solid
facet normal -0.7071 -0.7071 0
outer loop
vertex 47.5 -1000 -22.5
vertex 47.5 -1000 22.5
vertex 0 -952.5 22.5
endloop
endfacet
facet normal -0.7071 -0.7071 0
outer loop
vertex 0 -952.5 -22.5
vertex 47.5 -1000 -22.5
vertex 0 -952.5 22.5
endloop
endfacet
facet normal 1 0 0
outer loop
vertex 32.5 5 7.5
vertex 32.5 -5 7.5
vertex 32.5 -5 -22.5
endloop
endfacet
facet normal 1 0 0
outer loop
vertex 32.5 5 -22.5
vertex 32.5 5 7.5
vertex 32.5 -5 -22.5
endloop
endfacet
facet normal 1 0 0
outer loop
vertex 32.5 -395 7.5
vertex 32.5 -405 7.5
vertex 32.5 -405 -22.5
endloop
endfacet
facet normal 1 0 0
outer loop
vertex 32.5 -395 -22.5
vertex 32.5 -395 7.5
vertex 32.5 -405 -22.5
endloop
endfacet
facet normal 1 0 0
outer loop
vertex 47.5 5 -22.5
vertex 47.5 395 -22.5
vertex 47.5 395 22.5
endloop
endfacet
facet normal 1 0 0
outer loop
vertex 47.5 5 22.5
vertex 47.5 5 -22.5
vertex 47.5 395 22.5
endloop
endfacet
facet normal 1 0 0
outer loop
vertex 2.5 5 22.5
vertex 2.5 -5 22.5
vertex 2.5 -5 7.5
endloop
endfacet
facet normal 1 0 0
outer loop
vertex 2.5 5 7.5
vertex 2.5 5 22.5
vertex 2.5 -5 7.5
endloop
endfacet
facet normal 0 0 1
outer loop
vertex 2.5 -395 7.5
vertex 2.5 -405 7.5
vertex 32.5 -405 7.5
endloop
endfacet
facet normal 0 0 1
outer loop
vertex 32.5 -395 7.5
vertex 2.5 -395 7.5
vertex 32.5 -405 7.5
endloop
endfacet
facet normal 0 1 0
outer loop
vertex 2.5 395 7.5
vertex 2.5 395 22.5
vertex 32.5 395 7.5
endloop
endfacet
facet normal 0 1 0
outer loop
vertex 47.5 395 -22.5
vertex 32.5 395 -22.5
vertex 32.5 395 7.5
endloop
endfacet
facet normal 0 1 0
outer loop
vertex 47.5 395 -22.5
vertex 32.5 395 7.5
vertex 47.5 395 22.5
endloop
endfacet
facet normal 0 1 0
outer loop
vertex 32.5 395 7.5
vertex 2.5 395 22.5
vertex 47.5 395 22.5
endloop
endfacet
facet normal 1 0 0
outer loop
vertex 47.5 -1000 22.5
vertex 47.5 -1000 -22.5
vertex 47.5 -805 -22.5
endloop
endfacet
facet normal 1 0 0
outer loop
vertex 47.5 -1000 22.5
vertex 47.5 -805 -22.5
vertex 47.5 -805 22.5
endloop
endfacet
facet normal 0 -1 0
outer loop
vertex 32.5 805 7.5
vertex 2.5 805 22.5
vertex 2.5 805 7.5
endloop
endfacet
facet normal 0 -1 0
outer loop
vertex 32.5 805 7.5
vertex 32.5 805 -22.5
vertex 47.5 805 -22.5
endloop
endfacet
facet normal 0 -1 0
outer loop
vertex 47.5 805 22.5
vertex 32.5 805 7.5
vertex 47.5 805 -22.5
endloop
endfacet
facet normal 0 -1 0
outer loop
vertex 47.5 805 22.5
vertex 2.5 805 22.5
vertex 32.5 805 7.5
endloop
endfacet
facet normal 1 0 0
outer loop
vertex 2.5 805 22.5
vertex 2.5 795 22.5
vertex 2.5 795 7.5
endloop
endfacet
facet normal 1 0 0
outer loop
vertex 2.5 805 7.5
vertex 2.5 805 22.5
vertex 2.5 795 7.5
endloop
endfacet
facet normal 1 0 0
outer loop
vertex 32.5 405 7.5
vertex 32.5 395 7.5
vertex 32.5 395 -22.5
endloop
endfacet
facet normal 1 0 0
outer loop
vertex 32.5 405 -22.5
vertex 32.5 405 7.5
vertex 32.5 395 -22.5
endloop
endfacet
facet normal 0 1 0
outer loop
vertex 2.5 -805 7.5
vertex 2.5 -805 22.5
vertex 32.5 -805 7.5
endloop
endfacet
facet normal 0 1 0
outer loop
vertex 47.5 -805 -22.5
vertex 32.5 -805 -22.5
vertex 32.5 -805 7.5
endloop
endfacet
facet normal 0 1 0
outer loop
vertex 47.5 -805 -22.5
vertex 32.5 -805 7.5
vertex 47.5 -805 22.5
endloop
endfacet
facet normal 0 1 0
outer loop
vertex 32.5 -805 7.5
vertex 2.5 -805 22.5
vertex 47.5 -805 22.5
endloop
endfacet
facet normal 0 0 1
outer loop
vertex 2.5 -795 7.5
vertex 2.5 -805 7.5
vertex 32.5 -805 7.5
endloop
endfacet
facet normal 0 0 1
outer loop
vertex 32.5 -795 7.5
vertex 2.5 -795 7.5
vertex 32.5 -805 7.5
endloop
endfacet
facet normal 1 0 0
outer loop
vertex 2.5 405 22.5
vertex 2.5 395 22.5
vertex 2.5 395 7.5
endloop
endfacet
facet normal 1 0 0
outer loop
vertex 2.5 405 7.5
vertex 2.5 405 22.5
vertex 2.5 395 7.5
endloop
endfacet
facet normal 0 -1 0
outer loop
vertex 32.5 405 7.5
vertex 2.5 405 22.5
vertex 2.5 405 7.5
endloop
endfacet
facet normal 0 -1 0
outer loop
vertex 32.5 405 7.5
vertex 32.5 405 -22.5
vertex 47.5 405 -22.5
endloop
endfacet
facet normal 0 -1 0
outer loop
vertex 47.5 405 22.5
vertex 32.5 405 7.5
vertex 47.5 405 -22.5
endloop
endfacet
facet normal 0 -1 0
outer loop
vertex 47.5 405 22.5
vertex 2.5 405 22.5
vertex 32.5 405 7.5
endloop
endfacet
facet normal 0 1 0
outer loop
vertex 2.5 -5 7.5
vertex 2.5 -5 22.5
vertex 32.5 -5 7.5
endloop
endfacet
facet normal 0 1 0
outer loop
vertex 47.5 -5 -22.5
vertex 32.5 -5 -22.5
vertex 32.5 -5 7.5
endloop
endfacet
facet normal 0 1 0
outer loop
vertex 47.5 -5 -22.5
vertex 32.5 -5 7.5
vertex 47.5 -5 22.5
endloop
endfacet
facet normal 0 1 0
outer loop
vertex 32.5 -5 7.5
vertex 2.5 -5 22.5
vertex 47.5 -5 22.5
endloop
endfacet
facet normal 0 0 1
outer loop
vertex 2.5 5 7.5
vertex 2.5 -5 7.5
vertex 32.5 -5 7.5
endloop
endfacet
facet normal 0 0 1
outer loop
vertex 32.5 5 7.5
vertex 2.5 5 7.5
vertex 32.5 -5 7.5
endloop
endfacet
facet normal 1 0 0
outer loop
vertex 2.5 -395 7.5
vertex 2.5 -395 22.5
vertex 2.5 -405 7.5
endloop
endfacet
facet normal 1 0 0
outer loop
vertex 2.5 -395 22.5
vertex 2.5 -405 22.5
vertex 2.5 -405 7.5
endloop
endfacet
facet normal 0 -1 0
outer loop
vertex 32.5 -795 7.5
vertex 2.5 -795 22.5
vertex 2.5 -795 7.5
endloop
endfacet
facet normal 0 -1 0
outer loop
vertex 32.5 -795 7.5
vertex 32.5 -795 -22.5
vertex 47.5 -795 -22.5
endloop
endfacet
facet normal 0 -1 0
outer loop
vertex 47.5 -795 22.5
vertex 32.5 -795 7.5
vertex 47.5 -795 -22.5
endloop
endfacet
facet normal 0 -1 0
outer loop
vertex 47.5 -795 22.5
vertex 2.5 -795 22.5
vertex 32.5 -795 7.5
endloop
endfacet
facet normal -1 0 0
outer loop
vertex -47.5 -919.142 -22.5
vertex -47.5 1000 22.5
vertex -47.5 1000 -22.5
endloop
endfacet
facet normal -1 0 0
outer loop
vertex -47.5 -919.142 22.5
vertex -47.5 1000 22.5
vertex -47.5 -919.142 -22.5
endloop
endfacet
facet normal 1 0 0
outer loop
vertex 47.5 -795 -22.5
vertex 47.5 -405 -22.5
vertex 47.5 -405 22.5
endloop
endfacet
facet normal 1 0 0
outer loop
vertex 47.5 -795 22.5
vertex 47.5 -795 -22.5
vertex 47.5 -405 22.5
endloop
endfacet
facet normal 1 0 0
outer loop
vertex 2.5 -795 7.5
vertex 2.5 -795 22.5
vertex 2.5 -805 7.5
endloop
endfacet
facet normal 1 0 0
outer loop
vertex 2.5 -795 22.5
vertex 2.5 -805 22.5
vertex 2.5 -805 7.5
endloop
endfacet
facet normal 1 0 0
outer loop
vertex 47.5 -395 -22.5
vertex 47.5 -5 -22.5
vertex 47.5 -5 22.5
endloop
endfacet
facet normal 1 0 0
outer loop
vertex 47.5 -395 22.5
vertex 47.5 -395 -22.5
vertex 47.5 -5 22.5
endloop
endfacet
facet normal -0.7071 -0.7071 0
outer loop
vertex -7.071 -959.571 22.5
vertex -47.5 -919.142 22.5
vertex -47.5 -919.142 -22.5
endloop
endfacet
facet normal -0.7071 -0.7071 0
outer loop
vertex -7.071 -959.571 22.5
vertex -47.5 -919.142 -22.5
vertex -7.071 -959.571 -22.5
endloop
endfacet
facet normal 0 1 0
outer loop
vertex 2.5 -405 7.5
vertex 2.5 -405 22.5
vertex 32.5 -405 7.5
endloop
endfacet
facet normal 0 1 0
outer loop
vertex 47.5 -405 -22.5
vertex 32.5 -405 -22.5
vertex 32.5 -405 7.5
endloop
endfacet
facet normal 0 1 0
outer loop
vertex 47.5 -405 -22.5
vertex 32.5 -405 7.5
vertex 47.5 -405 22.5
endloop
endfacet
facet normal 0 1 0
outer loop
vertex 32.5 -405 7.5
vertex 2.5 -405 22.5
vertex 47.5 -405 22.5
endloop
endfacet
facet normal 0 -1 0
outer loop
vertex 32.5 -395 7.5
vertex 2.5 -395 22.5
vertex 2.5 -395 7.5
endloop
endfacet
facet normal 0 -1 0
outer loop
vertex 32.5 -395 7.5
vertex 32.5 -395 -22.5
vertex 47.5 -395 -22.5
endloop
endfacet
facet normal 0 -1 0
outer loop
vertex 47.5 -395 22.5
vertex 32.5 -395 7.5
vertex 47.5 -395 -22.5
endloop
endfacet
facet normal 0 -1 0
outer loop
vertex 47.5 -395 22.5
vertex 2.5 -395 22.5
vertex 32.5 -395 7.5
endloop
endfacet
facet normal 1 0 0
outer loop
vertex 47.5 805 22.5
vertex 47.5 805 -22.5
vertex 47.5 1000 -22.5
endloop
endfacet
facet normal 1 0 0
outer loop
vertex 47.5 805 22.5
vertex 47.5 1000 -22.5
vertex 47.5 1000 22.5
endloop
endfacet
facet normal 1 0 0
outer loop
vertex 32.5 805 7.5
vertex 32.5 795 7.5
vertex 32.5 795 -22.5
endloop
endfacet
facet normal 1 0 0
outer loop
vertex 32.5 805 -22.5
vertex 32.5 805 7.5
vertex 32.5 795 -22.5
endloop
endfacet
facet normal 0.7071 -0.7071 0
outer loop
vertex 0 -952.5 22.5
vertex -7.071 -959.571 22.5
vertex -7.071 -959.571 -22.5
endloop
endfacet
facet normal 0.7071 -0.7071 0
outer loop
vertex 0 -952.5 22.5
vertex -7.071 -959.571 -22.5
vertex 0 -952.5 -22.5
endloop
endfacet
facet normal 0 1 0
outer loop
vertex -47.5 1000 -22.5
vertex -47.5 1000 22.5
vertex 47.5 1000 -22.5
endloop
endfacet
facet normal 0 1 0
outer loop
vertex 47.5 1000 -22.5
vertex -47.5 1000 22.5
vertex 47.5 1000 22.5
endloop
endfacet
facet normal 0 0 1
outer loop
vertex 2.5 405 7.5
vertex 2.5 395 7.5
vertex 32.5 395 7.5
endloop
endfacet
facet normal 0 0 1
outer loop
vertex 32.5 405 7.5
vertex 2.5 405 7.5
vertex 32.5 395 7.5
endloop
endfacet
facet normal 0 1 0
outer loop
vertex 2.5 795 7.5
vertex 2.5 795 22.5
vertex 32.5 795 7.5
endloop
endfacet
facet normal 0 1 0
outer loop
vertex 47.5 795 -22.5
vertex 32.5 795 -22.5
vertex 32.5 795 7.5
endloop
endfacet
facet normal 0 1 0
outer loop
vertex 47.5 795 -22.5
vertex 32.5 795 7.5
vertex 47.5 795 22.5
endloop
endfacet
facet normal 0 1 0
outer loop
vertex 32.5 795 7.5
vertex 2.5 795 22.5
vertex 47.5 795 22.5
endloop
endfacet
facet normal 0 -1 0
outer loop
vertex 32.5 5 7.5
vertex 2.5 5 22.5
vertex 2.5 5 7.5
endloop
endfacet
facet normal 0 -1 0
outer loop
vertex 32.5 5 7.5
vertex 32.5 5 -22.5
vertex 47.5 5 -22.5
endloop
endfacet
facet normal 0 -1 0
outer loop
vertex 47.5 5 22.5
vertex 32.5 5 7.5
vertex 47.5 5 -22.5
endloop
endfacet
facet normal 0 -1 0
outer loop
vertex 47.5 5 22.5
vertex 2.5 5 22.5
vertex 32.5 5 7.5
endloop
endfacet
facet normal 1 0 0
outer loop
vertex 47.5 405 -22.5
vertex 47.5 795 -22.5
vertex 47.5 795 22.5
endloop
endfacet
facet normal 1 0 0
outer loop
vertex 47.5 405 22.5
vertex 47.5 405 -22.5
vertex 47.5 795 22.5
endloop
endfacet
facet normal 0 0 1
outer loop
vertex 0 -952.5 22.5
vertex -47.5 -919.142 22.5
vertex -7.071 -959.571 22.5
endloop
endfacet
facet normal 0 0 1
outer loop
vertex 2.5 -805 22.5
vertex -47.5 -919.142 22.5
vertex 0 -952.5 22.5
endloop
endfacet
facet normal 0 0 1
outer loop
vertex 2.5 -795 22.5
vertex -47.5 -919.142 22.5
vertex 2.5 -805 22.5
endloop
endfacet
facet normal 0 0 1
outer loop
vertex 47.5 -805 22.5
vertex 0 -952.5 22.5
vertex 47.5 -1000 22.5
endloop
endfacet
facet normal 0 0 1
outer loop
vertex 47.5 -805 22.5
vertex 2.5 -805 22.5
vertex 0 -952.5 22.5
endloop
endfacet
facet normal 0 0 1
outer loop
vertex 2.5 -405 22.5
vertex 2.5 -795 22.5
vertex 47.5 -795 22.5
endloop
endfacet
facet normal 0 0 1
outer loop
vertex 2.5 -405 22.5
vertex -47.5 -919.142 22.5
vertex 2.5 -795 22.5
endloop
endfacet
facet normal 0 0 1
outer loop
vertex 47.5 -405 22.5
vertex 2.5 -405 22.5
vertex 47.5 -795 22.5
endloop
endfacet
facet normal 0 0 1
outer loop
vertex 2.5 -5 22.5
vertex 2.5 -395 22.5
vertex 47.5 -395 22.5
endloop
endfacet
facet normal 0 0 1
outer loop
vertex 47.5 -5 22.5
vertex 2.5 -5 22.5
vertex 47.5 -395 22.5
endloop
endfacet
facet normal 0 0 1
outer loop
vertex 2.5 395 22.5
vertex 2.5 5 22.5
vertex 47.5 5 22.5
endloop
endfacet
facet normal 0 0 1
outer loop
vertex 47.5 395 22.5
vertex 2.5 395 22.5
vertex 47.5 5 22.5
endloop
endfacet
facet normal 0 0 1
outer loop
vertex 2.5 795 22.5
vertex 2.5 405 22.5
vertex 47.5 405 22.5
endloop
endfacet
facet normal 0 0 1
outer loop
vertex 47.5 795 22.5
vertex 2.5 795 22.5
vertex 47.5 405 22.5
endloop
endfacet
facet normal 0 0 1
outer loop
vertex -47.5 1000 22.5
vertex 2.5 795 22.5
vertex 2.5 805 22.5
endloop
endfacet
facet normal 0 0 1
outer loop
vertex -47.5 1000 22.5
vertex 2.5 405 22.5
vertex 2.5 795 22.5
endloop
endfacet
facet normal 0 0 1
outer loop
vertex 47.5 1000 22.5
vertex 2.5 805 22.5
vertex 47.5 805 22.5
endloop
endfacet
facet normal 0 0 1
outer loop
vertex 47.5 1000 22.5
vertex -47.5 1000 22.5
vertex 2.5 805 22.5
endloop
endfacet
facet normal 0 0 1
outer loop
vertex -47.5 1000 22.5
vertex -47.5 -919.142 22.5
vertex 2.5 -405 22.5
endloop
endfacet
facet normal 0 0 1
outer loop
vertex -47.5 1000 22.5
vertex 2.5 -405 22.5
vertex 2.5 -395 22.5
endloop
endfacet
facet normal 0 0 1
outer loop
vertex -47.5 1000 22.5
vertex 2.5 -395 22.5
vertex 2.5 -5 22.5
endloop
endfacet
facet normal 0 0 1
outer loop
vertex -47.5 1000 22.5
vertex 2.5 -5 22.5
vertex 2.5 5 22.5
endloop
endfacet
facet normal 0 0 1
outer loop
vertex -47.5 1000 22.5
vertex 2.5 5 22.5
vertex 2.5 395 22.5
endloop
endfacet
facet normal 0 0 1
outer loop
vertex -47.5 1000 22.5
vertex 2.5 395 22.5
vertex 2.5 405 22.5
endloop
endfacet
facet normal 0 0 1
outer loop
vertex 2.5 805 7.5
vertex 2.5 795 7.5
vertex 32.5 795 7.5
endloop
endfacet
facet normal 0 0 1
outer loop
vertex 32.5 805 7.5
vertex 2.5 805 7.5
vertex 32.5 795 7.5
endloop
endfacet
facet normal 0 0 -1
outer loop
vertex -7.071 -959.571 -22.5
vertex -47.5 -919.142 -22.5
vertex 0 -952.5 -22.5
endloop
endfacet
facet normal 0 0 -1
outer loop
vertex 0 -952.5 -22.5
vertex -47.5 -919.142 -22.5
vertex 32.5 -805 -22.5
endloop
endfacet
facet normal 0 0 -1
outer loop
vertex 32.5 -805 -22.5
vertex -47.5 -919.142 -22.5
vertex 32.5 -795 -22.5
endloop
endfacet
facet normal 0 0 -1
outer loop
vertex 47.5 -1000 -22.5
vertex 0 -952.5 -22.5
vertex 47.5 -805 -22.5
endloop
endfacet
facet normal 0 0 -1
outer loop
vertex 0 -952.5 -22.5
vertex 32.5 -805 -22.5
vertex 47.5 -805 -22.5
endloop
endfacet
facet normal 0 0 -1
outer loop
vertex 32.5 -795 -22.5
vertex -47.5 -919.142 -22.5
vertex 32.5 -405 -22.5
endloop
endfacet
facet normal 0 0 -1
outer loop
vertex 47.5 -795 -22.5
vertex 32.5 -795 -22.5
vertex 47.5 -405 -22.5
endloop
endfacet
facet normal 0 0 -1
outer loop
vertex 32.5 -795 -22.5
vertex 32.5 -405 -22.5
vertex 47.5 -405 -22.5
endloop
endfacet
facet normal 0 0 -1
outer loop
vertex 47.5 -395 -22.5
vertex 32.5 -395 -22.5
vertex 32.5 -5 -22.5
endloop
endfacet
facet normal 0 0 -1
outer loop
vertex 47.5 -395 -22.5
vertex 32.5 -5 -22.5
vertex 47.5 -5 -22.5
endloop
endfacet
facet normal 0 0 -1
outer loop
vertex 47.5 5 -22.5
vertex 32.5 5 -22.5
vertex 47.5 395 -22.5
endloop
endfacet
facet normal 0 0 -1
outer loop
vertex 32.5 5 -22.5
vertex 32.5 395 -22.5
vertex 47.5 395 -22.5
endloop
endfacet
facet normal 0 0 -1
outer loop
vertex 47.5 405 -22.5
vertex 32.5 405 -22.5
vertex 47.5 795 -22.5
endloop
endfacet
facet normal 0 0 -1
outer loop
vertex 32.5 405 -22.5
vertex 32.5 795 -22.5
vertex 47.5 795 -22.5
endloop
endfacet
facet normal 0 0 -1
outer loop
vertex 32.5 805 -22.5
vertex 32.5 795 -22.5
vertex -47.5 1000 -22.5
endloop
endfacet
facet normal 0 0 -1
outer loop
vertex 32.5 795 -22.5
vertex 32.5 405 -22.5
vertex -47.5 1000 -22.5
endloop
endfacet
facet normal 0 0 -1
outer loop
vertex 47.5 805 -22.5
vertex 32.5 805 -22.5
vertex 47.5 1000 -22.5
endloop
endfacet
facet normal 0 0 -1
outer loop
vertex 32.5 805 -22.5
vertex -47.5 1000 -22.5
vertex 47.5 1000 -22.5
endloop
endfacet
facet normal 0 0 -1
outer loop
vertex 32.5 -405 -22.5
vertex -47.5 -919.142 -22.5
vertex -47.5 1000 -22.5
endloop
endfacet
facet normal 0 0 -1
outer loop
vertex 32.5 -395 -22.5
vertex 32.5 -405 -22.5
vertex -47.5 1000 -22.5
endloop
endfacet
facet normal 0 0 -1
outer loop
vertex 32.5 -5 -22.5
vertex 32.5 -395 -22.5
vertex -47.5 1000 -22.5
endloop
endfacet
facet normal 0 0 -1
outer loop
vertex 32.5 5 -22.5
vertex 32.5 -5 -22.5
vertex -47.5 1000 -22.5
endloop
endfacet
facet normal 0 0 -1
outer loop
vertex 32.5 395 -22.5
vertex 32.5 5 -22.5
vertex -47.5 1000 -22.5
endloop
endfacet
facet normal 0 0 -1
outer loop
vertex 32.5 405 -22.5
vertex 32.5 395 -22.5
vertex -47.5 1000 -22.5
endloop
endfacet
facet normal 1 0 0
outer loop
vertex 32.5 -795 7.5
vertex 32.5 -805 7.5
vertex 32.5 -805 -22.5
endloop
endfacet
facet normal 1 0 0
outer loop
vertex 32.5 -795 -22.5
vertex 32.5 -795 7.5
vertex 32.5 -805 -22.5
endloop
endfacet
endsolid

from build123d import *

# Parameters (mm, degrees)
F0_W            = 95
F0_H            = 45
F1_DEPTH        = 1250
F2_W            = 95
F2_H            = 250
F3_DEPTH        = 45
F5_DEPTH        = 5
F5_COPIES_COUNT = 3
F5_COPIES_PITCH = 400
F8_DEPTH        = 5
F11_DEPTH       = 5
F13_DEPTH       = 45


# Not quite as in the source:
# - a pattern or mirror of a feature is missing from the dataset's text; its kind, count and spacing are read off the source's solid


with BuildPart() as f1:
    # F0 (on Front) → F1 (new body, symmetric)
    with BuildSketch(Plane.XZ):
        Rectangle(F0_W, F0_H)
    extrude(amount=F1_DEPTH, both=True)

    # F2 (on face) → F3 (cut, through all)
    with BuildSketch(Plane.XY.offset(22.5)):
        with Locations((0, 1125)):
            Rectangle(F2_W, F2_H)
        Polygon((47.5, -1250), (47.5, -1000), (-47.5, -905), (-47.5, -1250), align=None)
    extrude(amount=-F3_DEPTH, mode=Mode.SUBTRACT)

    # F4 (on Front) → F5 (cut, symmetric)
    with BuildSketch(Plane.XZ):
        Polygon((47.5, 22.5), (2.5, 22.5), (2.5, 7.5), (32.5, 7.5), (32.5, -22.5), (47.5, -22.5), align=None)
    f5 = extrude(amount=F5_DEPTH, both=True, mode=Mode.SUBTRACT)

    # F5_copies: F5 ×3
    with Locations(*[(0, i * F5_COPIES_PITCH, 0) for i in range(1, F5_COPIES_COUNT)]):
        add(f5, mode=Mode.SUBTRACT)

    # F7 (on offset) → F8 (cut, symmetric)
    with BuildSketch(Plane.XZ.offset(800)):
        Polygon((2.5, 22.5), (2.5, 7.5), (32.5, 7.5), (32.5, -22.5), (47.5, -22.5), (47.5, 22.5), align=None)
    extrude(amount=F8_DEPTH, both=True, mode=Mode.SUBTRACT)

    # F10 (on offset) → F11 (cut, symmetric)
    with BuildSketch(Plane.XZ.offset(400)):
        Polygon((2.5, 22.5), (2.5, 7.5), (32.5, 7.5), (32.5, -22.5), (47.5, -22.5), (47.5, 22.5), align=None)
    extrude(amount=F11_DEPTH, both=True, mode=Mode.SUBTRACT)

    # F12 (on face) → F13 (join, through all)
    with BuildSketch(Plane.XY.offset(22.5)):
        Polygon((0, -952.5), (-47.5, -905), (-47.5, -919.1421356237), (-7.0710678119, -959.5710678119), align=None)
    extrude(amount=-F13_DEPTH)


solid = f1.part
